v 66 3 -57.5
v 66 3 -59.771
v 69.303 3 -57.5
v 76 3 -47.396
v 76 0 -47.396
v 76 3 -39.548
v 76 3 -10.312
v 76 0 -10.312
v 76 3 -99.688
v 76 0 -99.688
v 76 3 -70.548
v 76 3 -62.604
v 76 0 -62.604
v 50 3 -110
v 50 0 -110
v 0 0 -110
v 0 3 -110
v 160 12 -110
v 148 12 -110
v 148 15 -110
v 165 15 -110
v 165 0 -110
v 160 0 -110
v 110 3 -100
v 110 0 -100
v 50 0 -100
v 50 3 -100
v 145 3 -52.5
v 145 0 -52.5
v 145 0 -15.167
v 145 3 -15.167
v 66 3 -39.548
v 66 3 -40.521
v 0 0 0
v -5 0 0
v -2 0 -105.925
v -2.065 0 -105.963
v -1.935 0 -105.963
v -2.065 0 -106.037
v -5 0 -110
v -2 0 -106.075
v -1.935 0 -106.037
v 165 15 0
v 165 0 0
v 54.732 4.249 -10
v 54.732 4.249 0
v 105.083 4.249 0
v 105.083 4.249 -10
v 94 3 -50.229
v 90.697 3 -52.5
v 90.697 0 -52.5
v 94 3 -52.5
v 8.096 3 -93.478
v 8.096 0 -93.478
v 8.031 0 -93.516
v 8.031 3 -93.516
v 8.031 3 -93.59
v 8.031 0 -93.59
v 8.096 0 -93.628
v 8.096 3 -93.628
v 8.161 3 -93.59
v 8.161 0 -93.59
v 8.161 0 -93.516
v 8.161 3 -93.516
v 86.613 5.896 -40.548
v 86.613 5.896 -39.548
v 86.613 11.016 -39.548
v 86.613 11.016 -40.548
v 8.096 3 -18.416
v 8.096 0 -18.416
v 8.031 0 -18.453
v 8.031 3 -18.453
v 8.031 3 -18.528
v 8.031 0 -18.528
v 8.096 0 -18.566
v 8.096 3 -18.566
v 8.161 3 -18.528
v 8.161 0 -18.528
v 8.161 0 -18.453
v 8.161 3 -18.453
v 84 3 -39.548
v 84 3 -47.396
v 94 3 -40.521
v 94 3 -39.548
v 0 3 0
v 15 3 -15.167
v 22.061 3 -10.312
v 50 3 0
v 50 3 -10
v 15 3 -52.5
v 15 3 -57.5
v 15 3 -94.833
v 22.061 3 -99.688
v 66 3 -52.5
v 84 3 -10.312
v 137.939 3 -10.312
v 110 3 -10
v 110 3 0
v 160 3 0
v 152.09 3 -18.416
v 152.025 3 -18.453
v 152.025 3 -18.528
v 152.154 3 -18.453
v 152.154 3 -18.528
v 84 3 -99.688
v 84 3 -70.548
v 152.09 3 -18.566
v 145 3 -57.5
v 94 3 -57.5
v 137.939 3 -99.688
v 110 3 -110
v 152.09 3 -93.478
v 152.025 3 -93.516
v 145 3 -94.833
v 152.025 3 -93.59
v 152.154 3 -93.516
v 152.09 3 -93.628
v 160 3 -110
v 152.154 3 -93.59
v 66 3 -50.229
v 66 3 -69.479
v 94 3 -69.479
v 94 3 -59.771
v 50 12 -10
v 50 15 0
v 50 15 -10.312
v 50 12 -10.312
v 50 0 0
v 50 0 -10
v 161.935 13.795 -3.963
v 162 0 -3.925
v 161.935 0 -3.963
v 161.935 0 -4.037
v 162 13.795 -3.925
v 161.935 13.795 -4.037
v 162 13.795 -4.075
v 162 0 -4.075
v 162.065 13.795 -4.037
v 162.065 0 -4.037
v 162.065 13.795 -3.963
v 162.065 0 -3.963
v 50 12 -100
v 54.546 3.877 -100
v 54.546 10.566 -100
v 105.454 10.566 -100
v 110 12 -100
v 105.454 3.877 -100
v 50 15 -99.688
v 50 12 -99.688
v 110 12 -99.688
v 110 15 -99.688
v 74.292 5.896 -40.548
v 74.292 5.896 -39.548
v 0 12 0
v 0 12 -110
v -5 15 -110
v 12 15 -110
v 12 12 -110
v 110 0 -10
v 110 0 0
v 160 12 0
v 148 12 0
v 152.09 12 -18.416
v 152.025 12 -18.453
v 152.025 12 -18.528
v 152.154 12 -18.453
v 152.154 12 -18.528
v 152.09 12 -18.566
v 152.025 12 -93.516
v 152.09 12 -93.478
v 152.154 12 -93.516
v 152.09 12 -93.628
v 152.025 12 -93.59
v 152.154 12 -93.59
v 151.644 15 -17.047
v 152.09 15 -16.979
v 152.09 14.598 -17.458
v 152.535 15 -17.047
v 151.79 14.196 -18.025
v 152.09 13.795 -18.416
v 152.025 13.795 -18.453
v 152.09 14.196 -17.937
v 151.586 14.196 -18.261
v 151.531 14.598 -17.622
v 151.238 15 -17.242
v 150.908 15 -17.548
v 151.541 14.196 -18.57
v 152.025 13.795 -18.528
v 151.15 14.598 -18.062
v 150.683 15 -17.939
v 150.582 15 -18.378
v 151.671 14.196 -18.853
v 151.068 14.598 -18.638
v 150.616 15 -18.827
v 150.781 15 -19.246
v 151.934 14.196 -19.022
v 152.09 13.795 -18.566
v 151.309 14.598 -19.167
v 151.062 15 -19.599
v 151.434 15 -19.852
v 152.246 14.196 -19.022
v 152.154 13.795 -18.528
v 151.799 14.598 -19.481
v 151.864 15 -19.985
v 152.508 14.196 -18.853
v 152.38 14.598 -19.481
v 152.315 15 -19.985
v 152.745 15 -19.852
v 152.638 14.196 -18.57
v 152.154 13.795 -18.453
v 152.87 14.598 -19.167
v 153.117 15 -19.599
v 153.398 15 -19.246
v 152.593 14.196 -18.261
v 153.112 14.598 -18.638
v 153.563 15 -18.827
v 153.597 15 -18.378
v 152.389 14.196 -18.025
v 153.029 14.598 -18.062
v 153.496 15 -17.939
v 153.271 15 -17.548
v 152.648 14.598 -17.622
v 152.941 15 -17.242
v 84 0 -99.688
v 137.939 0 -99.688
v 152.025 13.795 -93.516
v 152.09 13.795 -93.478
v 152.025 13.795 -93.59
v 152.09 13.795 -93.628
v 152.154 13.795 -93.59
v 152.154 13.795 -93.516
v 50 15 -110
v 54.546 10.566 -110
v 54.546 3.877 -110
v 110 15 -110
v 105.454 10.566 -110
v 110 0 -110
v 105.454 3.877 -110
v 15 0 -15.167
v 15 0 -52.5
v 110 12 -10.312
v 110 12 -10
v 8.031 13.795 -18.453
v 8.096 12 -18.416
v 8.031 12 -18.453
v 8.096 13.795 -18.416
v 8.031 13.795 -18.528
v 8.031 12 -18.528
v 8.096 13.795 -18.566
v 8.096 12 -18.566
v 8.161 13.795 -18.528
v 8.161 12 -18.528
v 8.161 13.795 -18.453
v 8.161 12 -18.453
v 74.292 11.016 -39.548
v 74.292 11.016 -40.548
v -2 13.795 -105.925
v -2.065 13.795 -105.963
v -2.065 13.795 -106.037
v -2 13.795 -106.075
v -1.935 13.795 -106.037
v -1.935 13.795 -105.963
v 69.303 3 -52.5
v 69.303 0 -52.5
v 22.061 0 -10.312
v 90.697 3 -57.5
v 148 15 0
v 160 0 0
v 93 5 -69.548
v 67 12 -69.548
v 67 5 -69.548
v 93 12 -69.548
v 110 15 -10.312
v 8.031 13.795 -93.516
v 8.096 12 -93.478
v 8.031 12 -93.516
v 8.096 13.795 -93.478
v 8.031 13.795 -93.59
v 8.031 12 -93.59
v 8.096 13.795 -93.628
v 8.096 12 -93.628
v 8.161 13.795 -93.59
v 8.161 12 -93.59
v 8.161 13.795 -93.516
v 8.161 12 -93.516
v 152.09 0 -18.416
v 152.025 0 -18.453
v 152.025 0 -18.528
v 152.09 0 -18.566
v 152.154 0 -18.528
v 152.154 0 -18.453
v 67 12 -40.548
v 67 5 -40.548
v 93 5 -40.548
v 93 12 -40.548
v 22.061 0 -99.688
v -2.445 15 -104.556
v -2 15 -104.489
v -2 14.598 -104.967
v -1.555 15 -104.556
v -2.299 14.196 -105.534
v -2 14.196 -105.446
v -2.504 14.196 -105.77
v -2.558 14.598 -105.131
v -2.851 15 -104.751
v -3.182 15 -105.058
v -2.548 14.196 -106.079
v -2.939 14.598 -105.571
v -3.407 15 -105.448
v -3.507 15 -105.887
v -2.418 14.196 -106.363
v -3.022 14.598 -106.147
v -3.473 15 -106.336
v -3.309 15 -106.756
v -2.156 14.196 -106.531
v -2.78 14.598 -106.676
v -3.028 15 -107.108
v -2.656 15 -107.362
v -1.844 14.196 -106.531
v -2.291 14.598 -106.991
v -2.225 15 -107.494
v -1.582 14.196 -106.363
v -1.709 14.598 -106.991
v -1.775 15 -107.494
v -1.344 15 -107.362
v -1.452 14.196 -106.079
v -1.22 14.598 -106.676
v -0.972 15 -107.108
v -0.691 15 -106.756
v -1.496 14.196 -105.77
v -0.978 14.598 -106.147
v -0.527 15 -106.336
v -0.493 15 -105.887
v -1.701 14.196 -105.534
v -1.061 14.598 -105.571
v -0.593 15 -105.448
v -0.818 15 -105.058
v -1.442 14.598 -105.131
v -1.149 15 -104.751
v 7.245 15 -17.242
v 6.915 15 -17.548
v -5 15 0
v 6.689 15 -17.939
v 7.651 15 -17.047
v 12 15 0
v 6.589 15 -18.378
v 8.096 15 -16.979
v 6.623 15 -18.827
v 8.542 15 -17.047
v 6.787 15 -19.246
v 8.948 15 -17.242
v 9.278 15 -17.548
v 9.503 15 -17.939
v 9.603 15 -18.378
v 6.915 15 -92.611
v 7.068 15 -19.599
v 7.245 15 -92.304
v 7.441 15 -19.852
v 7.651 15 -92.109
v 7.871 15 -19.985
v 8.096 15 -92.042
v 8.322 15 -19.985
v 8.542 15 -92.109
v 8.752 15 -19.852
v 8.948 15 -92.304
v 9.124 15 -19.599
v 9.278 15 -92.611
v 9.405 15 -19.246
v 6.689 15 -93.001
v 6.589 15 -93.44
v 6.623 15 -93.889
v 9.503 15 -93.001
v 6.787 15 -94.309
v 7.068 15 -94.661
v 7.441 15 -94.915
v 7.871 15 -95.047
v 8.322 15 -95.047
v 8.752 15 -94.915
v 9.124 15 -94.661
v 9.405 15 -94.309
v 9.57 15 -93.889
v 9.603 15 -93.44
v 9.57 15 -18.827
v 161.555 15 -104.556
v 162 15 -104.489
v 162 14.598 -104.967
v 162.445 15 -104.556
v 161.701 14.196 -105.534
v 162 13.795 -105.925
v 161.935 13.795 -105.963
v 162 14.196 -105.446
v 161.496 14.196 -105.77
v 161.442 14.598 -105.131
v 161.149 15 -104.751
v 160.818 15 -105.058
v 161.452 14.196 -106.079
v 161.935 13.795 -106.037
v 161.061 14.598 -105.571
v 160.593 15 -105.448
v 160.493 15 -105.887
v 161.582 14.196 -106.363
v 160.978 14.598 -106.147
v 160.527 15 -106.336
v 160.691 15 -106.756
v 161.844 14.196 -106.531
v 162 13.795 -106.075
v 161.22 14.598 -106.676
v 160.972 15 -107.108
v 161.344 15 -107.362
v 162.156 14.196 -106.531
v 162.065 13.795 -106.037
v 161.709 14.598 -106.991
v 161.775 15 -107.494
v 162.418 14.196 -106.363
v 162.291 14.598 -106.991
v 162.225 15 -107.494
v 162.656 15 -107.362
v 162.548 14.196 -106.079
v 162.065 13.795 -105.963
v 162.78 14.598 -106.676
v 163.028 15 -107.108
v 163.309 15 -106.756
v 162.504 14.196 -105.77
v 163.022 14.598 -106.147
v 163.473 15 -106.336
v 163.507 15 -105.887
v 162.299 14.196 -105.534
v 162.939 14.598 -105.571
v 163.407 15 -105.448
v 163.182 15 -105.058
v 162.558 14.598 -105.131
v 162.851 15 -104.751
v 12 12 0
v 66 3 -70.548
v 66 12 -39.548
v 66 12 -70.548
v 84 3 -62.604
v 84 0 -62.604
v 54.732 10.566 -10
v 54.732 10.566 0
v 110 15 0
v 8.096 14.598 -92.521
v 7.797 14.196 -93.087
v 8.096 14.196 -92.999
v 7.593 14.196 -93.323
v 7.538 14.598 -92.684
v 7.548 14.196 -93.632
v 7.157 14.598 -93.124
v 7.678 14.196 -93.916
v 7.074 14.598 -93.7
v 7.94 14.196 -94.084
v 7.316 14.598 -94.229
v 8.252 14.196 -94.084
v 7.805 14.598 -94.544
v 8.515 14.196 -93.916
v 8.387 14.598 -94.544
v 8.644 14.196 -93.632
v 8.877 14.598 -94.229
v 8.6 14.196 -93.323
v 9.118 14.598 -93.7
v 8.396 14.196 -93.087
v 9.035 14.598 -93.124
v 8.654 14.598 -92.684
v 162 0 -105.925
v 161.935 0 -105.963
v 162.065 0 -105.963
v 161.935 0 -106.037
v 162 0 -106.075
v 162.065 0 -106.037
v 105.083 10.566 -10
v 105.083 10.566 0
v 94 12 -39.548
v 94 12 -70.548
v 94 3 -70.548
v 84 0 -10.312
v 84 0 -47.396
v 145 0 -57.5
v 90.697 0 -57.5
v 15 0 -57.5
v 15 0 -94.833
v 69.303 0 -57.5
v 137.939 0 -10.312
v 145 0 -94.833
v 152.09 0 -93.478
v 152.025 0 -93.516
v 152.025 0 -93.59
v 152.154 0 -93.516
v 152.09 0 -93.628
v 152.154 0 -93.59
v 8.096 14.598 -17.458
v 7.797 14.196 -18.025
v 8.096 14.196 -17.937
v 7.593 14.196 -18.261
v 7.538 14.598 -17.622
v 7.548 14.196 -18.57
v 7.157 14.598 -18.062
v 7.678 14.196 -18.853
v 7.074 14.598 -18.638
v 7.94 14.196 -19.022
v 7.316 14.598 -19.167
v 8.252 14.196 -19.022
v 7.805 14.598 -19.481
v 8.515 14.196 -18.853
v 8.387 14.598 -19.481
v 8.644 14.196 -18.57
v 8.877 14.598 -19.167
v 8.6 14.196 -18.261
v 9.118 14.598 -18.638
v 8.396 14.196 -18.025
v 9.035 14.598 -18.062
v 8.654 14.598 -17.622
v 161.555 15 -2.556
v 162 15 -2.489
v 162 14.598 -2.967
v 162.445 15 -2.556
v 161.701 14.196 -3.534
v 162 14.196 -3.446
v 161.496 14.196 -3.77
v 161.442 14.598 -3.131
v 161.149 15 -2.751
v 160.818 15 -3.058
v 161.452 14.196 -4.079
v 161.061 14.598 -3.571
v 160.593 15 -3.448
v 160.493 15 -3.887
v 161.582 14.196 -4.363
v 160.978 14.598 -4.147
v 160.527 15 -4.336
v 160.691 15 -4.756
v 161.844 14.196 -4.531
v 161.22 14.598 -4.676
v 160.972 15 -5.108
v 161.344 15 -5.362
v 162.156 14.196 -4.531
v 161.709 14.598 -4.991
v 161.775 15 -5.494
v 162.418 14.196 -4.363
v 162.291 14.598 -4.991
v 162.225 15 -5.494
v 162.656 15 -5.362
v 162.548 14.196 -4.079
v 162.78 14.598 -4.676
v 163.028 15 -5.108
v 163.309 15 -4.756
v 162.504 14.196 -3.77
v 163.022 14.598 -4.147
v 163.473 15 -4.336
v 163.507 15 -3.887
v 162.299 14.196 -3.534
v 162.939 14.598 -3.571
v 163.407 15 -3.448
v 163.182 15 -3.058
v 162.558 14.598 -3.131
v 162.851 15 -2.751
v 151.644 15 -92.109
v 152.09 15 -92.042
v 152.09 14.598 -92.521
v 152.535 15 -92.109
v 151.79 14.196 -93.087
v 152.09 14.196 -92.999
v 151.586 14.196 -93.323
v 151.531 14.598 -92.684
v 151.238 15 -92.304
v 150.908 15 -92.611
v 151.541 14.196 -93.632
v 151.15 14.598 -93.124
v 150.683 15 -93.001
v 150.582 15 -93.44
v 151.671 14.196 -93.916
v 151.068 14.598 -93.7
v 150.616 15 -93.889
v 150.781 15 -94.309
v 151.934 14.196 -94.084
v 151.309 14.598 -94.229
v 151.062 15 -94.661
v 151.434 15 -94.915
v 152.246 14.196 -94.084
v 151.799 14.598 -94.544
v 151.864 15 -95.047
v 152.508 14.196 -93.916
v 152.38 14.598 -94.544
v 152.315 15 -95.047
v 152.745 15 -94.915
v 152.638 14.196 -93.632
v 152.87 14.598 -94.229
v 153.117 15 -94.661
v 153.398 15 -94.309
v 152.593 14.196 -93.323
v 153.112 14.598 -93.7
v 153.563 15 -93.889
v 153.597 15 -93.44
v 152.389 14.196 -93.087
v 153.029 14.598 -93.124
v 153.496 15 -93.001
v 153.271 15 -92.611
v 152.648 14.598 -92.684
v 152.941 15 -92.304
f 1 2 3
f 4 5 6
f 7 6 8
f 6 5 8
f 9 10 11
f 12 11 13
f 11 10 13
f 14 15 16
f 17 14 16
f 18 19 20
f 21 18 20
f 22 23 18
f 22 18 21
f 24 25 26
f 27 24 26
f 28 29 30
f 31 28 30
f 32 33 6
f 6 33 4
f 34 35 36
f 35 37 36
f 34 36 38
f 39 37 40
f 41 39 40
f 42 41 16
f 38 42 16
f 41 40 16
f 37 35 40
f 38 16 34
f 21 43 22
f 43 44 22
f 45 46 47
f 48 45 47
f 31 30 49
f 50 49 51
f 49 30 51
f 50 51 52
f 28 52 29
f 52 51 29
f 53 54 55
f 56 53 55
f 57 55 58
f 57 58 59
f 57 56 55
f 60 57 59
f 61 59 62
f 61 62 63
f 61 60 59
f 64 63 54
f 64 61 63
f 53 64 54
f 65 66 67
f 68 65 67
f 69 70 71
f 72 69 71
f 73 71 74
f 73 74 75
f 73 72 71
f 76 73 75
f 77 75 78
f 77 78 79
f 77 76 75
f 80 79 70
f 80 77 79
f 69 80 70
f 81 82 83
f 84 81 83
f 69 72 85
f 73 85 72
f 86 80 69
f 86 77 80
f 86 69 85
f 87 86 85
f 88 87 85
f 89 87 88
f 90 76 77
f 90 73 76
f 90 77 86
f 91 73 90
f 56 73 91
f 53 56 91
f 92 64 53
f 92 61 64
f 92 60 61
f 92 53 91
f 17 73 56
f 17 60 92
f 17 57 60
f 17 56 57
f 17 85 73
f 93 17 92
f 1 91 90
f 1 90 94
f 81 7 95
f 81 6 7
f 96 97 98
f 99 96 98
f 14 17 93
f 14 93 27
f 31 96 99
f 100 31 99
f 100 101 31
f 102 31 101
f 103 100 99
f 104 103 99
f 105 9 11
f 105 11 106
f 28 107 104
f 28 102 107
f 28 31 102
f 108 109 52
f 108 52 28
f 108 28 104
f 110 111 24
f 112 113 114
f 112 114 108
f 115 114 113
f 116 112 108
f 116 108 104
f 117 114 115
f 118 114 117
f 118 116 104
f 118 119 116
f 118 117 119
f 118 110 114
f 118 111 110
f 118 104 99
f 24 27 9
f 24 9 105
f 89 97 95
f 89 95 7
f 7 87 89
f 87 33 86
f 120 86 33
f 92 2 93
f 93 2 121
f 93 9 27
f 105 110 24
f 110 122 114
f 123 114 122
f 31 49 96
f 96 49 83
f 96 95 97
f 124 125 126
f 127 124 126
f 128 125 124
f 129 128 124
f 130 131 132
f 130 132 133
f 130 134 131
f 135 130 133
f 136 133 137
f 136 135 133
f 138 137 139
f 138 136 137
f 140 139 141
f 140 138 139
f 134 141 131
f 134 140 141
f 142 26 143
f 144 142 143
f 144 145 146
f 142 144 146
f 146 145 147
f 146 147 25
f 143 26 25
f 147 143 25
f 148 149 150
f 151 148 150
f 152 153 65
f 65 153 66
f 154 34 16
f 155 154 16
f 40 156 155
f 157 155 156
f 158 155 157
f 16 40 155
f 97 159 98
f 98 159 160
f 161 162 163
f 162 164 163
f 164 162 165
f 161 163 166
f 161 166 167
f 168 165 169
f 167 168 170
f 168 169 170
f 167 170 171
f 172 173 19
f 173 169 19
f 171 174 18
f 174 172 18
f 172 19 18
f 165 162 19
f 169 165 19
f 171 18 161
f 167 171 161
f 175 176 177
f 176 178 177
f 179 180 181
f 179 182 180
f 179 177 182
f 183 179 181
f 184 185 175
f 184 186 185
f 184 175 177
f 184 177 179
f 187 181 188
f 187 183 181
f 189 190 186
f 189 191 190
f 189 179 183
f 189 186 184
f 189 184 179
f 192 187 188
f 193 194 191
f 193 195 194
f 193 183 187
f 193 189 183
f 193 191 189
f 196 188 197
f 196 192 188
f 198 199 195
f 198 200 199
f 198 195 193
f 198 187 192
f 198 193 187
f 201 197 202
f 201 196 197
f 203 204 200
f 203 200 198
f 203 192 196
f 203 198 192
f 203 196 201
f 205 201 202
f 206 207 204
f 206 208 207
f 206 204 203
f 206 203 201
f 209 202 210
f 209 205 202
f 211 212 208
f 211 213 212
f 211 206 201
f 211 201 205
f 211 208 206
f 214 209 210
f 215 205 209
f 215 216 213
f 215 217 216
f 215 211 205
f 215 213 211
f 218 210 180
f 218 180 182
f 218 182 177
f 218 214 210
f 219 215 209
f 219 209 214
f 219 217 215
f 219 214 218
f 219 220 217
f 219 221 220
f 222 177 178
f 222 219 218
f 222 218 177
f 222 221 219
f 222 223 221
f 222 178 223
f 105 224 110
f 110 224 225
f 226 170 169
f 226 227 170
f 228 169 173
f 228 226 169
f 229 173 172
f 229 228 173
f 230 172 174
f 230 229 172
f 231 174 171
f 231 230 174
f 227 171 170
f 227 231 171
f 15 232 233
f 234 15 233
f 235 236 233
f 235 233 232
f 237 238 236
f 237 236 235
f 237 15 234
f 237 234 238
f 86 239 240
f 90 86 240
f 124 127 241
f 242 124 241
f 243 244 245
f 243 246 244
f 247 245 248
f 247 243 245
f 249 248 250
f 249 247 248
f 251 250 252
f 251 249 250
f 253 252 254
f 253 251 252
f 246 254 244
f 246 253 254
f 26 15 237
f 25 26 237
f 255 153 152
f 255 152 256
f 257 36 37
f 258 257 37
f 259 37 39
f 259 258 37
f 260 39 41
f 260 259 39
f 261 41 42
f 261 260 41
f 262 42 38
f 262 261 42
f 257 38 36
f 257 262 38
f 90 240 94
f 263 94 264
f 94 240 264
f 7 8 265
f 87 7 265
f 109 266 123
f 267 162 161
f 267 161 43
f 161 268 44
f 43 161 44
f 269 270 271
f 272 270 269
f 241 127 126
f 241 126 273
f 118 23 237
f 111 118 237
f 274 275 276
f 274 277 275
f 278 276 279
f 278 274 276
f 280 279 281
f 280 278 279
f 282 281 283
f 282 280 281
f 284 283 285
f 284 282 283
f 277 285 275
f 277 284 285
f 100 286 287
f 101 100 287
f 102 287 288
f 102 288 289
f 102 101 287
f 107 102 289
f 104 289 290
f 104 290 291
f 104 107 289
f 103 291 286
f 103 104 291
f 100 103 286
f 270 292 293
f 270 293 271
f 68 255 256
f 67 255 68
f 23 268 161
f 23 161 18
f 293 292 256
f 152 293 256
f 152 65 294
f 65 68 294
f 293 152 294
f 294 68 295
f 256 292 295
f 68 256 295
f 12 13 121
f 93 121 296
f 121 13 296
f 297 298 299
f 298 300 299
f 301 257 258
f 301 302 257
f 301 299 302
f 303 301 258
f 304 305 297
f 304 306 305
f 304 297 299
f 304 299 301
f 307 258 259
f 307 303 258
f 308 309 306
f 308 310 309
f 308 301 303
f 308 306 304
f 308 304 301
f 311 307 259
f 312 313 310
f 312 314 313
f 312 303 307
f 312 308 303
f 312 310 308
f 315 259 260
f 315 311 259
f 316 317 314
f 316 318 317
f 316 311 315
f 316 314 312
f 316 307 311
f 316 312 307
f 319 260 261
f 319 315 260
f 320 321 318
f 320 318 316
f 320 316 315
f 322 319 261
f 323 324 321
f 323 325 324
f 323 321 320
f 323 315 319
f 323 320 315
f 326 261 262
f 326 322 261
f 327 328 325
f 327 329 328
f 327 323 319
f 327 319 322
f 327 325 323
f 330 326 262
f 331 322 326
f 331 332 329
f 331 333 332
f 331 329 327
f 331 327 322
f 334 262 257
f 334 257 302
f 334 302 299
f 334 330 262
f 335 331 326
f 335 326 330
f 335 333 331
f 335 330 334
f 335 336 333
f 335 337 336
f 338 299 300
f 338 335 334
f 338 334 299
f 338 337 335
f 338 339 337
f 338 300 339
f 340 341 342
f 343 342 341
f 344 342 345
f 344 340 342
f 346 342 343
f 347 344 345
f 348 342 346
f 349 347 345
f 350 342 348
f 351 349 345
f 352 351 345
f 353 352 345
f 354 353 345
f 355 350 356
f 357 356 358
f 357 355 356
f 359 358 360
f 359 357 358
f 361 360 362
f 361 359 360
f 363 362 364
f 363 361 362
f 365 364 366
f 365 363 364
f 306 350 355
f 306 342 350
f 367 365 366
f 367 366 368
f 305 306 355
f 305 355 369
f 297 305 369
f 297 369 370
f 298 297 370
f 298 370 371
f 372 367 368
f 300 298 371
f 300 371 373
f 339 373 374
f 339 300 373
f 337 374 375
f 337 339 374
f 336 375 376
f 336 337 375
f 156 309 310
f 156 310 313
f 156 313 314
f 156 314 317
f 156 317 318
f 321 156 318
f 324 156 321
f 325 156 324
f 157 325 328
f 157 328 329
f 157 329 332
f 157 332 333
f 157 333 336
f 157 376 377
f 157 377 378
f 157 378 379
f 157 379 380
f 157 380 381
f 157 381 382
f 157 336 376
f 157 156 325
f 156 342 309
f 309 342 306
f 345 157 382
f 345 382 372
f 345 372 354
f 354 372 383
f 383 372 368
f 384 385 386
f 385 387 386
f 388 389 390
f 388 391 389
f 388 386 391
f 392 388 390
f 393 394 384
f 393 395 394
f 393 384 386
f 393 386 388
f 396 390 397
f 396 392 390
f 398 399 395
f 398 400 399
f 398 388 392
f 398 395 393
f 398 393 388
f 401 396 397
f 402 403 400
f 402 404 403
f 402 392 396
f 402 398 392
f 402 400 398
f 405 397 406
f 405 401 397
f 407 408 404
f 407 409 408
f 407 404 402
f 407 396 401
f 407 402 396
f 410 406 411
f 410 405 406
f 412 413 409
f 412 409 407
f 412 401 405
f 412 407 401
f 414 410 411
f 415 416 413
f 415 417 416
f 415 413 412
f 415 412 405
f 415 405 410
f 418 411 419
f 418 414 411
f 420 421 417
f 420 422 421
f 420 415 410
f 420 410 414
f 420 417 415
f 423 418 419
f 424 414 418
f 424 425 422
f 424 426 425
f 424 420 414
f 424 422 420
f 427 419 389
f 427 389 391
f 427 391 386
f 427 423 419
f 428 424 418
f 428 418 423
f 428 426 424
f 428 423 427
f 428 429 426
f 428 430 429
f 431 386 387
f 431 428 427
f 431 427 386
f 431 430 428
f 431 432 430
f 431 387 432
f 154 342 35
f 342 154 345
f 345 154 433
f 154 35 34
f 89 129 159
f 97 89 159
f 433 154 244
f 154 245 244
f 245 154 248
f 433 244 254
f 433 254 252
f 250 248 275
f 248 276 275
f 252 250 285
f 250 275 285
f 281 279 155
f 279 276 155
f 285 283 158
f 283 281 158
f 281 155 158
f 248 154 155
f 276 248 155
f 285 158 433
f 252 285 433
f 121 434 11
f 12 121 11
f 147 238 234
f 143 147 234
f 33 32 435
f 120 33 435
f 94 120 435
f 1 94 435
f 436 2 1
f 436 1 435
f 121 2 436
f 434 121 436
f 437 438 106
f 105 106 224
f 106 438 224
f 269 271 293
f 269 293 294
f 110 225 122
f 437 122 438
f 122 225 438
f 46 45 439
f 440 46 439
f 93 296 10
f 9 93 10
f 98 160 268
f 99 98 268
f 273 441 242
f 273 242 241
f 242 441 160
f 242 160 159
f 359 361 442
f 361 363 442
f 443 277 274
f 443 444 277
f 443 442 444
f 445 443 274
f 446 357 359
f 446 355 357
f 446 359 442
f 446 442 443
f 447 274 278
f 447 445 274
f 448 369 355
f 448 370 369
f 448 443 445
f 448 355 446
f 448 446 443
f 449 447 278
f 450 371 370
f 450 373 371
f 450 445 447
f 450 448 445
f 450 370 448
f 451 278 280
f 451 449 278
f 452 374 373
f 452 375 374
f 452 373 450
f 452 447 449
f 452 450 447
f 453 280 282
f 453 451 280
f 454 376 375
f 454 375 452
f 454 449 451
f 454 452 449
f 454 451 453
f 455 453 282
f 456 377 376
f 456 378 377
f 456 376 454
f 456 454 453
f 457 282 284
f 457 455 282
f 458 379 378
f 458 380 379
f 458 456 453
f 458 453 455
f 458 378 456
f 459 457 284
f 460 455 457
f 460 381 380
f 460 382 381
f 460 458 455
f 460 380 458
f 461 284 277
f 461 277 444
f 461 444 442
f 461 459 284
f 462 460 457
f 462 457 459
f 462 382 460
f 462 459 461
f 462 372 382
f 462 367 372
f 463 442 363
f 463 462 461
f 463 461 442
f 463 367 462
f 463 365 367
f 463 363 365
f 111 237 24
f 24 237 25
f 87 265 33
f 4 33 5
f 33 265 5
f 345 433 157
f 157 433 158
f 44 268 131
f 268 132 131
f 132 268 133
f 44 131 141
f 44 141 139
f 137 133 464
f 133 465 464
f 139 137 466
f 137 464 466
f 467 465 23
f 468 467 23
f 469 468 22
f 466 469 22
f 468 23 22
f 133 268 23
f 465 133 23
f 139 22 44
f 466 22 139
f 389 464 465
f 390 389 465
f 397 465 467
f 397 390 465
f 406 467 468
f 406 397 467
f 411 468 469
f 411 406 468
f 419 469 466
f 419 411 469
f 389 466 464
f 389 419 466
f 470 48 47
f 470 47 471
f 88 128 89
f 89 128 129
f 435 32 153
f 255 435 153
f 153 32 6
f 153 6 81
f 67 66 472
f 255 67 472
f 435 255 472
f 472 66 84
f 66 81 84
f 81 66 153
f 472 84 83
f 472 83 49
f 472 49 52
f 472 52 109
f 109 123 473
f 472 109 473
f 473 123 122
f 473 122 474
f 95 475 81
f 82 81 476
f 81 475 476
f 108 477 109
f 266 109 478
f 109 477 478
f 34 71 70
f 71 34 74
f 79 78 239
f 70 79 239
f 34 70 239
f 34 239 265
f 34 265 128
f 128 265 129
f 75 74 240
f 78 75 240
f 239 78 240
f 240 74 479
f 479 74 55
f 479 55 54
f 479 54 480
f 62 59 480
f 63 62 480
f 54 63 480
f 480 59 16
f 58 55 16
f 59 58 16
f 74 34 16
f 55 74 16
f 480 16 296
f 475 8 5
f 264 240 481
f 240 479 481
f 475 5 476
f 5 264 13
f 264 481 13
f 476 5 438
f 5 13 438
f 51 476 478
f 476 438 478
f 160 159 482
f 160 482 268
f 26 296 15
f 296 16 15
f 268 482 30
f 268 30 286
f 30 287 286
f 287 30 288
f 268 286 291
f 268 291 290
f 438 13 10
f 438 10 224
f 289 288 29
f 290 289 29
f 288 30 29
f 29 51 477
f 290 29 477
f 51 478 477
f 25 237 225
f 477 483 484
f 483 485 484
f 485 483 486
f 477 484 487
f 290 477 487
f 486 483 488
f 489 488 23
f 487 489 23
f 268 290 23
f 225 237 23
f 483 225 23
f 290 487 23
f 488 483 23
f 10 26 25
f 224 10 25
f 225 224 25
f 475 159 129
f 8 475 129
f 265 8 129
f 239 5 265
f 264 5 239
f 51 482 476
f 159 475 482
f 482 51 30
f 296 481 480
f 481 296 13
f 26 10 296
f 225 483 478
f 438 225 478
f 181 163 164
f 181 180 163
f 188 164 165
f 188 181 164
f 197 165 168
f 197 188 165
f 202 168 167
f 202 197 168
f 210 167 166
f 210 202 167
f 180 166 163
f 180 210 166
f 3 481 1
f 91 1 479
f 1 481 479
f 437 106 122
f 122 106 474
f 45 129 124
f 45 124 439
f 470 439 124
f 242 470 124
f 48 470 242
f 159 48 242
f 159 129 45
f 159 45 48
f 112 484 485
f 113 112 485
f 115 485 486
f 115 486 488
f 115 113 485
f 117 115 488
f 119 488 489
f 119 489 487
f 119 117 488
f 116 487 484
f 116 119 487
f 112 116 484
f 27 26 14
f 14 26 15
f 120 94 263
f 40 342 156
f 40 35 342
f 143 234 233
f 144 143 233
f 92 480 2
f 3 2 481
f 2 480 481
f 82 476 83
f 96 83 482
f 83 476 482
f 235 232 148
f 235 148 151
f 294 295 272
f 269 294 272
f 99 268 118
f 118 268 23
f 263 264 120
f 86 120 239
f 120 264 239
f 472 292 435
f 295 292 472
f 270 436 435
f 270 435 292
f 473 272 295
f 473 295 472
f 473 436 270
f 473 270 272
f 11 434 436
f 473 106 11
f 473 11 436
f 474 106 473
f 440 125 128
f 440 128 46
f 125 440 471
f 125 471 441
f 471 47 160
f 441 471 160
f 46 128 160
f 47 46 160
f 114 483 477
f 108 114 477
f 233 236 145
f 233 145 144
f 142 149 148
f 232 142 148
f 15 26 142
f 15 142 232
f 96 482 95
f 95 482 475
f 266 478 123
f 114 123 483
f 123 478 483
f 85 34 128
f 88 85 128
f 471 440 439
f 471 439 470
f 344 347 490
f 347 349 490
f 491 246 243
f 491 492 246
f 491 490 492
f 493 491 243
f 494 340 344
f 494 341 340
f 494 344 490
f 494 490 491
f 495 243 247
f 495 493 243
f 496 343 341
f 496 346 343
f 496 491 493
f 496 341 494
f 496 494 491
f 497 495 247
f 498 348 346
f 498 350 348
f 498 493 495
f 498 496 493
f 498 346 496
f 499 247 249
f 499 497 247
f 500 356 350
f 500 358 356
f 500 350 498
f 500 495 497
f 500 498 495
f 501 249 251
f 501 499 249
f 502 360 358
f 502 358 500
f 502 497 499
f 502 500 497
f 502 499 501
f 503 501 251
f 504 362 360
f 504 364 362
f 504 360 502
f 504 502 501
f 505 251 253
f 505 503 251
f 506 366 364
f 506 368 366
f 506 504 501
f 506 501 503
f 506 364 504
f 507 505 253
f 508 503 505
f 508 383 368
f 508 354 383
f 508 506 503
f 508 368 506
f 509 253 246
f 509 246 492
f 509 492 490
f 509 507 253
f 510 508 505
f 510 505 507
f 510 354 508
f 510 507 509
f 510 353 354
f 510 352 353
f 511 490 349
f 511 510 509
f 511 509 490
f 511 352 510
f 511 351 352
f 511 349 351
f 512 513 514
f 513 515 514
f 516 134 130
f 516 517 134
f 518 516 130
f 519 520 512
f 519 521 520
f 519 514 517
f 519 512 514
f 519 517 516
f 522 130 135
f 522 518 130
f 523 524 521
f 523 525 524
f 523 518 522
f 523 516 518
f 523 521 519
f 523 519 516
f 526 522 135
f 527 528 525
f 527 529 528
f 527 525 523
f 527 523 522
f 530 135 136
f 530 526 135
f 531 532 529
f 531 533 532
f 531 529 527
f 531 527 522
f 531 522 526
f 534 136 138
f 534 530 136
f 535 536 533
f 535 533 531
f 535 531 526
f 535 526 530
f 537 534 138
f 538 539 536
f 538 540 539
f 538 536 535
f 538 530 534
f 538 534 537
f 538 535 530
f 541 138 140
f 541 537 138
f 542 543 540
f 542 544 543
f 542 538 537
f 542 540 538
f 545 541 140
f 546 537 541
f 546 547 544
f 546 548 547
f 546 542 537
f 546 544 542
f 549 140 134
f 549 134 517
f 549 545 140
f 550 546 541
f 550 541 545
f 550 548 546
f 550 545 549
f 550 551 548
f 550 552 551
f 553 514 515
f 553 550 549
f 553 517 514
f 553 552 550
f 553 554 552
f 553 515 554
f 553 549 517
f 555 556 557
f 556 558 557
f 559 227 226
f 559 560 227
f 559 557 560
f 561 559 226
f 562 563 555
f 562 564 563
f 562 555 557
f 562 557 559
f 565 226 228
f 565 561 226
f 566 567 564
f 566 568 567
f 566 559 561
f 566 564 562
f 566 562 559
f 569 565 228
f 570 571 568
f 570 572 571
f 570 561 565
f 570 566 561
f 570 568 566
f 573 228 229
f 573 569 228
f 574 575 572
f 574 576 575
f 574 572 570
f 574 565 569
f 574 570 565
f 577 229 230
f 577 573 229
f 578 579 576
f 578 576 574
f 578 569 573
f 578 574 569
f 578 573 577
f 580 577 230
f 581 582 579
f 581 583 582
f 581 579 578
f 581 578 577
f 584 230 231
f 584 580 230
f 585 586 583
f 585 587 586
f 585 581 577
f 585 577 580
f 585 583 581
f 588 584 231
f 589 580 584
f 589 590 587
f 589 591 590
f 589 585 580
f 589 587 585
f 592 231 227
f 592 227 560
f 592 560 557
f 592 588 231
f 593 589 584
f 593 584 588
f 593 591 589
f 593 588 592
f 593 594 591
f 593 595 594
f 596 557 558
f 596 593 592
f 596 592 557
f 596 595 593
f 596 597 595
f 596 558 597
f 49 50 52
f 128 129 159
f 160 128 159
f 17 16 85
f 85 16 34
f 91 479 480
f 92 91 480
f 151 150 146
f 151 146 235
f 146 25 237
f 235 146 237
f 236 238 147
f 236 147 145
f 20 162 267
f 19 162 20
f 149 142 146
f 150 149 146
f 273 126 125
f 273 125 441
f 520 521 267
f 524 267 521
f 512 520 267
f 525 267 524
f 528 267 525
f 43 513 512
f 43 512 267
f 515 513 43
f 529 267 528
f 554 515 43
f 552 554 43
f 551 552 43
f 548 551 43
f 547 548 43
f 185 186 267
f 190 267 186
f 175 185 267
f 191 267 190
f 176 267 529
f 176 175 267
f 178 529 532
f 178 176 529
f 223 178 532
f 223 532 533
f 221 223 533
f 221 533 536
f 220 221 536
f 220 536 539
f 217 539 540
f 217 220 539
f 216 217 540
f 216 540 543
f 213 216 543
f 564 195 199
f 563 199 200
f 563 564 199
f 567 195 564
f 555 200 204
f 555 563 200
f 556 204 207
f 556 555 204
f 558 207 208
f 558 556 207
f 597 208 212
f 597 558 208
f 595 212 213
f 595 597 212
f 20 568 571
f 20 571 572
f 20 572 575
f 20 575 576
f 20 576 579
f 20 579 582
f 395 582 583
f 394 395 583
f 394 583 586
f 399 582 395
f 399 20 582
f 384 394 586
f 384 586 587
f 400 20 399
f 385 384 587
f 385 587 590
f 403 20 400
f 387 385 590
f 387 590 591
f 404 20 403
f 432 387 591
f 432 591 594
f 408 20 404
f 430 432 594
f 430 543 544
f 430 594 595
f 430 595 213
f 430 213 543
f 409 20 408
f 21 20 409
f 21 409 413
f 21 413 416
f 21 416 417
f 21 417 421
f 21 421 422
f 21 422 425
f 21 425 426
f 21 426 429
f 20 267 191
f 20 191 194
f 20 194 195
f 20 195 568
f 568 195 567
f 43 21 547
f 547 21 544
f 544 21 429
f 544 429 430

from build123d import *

# Parameters (mm, degrees)
BOSS_EXTRUDE1_DEPTH                   = 3
SKETCH1_5_W                           = 5
SKETCH1_5_H                           = 110
BOSS_EXTRUDE2_DEPTH                   = 12
SKETCH1_5_W_2                         = 60
SKETCH1_5_H_2                         = 10
BOSS_EXTRUDE2_2_DEPTH                 = 12
BOSS_EXTRUDE2_3_DEPTH                 = 12
BOSS_EXTRUDE2_4_DEPTH                 = 12
SKETCH2_W                             = 17
SKETCH2_H                             = 110
SKETCH2_W_2                           = 60
SKETCH2_H_2                           = 10.3125
BOSS_EXTRUDE3_DEPTH                   = 3
SKETCH3_W                             = 50.351183416
SKETCH3_H                             = 6.317122643
CUT_EXTRUDE1_DEPTH                    = 12
SKETCH4_W                             = 50.90857659
SKETCH4_H                             = 6.688718092
CUT_EXTRUDE2_DEPTH                    = 12
SKETCH5_W                             = 28
SKETCH5_H                             = 31
BOSS_EXTRUDE4_DEPTH                   = 9
SKETCH6_W                             = 26
SKETCH6_H                             = 29
CUT_EXTRUDE3_DEPTH                    = 7
SKETCH7_W                             = 12.321460949
SKETCH7_H                             = 5.119870138
CUT_EXTRUDE4_DEPTH                    = 2
F_97_0_0059_DIAMETER_HOLE9_AT_2_COUNT = 2
F_97_0_0059_DIAMETER_HOLE9_AT_2_PITCH = 75.062280812
F_97_0_0059_DIAMETER_HOLE9_AT_3_COUNT = 2
F_97_0_0059_DIAMETER_HOLE9_AT_3_PITCH = 162.38349121
F_97_0_0059_DIAMETER_HOLE9_AT_4_COUNT = 2
F_97_0_0059_DIAMETER_HOLE9_AT_4_PITCH = 143.993236706


with BuildPart() as part:
    # Sketch1 → Boss-Extrude1 (new body)
    with BuildSketch(Plane(origin=(0, 0, 0), x_dir=(1, 0, 0), z_dir=(0, 1, 0))):
        Polygon((0, 0), (50, 0), (50, 10), (110, 10), (110, 0), (160, 0), (160, 110), (110, 110), (110, 100), (50, 100), (50, 110), (0, 110), align=None)
        Polygon((22.060541032, 10.3125), (76, 47.39587804), (76, 10.3125), align=None, mode=Mode.SUBTRACT)
        Polygon((15, 15.16662196), (15, 52.5), (69.303095331, 52.5), align=None, mode=Mode.SUBTRACT)
        Polygon((84, 10.3125), (84, 47.39587804), (137.939458968, 10.3125), align=None, mode=Mode.SUBTRACT)
        Polygon((15, 57.5), (15, 94.83337804), (69.303095331, 57.5), align=None, mode=Mode.SUBTRACT)
        Polygon((145, 15.16662196), (90.696904669, 52.5), (145, 52.5), align=None, mode=Mode.SUBTRACT)
        Polygon((22.060541032, 99.6875), (76, 99.6875), (76, 62.60412196), align=None, mode=Mode.SUBTRACT)
        Polygon((145, 57.5), (90.696904669, 57.5), (145, 94.83337804), align=None, mode=Mode.SUBTRACT)
        Polygon((84, 62.60412196), (84, 99.6875), (137.939458968, 99.6875), align=None, mode=Mode.SUBTRACT)
    extrude(amount=BOSS_EXTRUDE1_DEPTH)

    # Sketch5 → Boss-Extrude4 (add)
    with BuildSketch(Plane(origin=(0, 3, 0), x_dir=(1, 0, 0), z_dir=(0, 1, 0))):
        with Locations((80, 55.04790198)):
            Rectangle(SKETCH5_W, SKETCH5_H)
    extrude(amount=BOSS_EXTRUDE4_DEPTH)

    # Sketch6 → Cut-Extrude3 (cut)
    with BuildSketch(Plane(origin=(0, 12, 0), x_dir=(1, 0, 0), z_dir=(0, 1, 0))):
        with Locations((80, 55.04790198)):
            Rectangle(SKETCH6_W, SKETCH6_H)
    extrude(amount=-CUT_EXTRUDE3_DEPTH, mode=Mode.SUBTRACT)

    # Sketch7 → Cut-Extrude4 (cut)
    with BuildSketch(Plane.XY.offset(-39.54790198)):
        with Locations((80.452241745, 8.456025881)):
            Rectangle(SKETCH7_W, SKETCH7_H)
    extrude(amount=-CUT_EXTRUDE4_DEPTH, mode=Mode.SUBTRACT)


with BuildPart() as body_2:
    # Sketch1<5> → Boss-Extrude2 (new body)
    with BuildSketch(Plane(origin=(0, 0, 0), x_dir=(1, 0, 0), z_dir=(0, 1, 0))):
        with Locations((-2.5, 55)):
            Rectangle(SKETCH1_5_W, SKETCH1_5_H)
    extrude(amount=BOSS_EXTRUDE2_DEPTH)



with BuildPart() as body_3:
    # Sketch1<5> → Boss-Extrude2 2 (new body)
    with BuildSketch(Plane(origin=(0, 0, 0), x_dir=(1, 0, 0), z_dir=(0, 1, 0))):
        with Locations((80, 5)):
            Rectangle(SKETCH1_5_W_2, SKETCH1_5_H_2)
    extrude(amount=BOSS_EXTRUDE2_2_DEPTH)


with BuildPart() as body_4:
    # Sketch1<5> → Boss-Extrude2 3 (new body)
    with BuildSketch(Plane(origin=(0, 0, 0), x_dir=(1, 0, 0), z_dir=(0, 1, 0))):
        with Locations((80, 105)):
            Rectangle(SKETCH1_5_W_2, SKETCH1_5_H_2)
    extrude(amount=BOSS_EXTRUDE2_3_DEPTH)


with BuildPart() as body_5:
    # Sketch1<5> → Boss-Extrude2 4 (new body)
    with BuildSketch(Plane(origin=(0, 0, 0), x_dir=(1, 0, 0), z_dir=(0, 1, 0))):
        with Locations((162.5, 55)):
            Rectangle(SKETCH1_5_W, SKETCH1_5_H)
    extrude(amount=BOSS_EXTRUDE2_4_DEPTH)


with BuildPart() as body_2_1:
    add(body_2.part)

    add(body_3.part)  # Boss-Extrude3 merges body 3

    add(body_4.part)  # Boss-Extrude3 merges body 4

    add(body_5.part)  # Boss-Extrude3 merges body 5
    # Sketch2 → Boss-Extrude3 (add)
    with BuildSketch(Plane(origin=(0, 12, 0), x_dir=(1, 0, 0), z_dir=(0, 1, 0))):
        with Locations((3.5, 55)):
            Rectangle(SKETCH2_W, SKETCH2_H)
        with Locations((156.5, 55)):
            Rectangle(SKETCH2_W, SKETCH2_H)
        with Locations((80, 104.84375)):
            Rectangle(SKETCH2_W_2, SKETCH2_H_2)
        with Locations((80, 5.15625)):
            Rectangle(SKETCH2_W_2, SKETCH2_H_2)
    extrude(amount=BOSS_EXTRUDE3_DEPTH)

    # Sketch3 → Cut-Extrude1 (cut)
    with BuildSketch(Plane.XY):
        with Locations((79.907101138, 7.407101137)):
            Rectangle(SKETCH3_W, SKETCH3_H)
    extrude(amount=-CUT_EXTRUDE1_DEPTH, mode=Mode.SUBTRACT)

    # Sketch4 → Cut-Extrude2 (cut)
    with BuildSketch(Plane(origin=(0, 0, -110), x_dir=(-1, 0, 0), z_dir=(0, 0, -1))):
        with Locations((-80, 7.221303413)):
            Rectangle(SKETCH4_W, SKETCH4_H)
    extrude(amount=-CUT_EXTRUDE2_DEPTH, mode=Mode.SUBTRACT)

    # Sketch14 → #97 (0.0059) Diameter Hole2 (revolve, cut)
    with BuildSketch(Plane(origin=(-2, 15, -106), x_dir=(0, 0, 1), z_dir=(1, 0, 0))):
        Polygon((0, 0), (0, 15), (0.07493, 15), (0.07493, 1.205257537), (1.5113, 0), align=None)
    revolve(axis=Axis((-2, 21.35, -106), (0, -1, 0)), mode=Mode.SUBTRACT)

    # Sketch18 → #97 (0.0059) Diameter Hole4 (revolve, cut)
    with BuildSketch(Plane(origin=(162, 15, -106), x_dir=(0, 0, 1), z_dir=(1, 0, 0))):
        Polygon((0, 0), (0, 15), (0.07493, 15), (0.07493, 1.205257537), (1.5113, 0), align=None)
    revolve(axis=Axis((162, 21.35, -106), (0, -1, 0)), mode=Mode.SUBTRACT)

    # Sketch20 → #97 (0.0059) Diameter Hole5 (revolve, cut)
    with BuildSketch(Plane(origin=(162, 15, -4), x_dir=(0, 0, 1), z_dir=(1, 0, 0))):
        Polygon((0, 0), (0, 15), (0.07493, 15), (0.07493, 1.205257537), (1.5113, 0), align=None)
    revolve(axis=Axis((162, 21.35, -4), (0, -1, 0)), mode=Mode.SUBTRACT)


with BuildPart() as f_97_0_0059_diameter_hole9_tool:
    # Sketch31 → #97 (0.0059) Diameter Hole9 (revolve)
    with BuildSketch(Plane(origin=(8.09628051, 15, -93.553027892), x_dir=(0, 0, 1), z_dir=(1, 0, 0))):
        Polygon((0, 0), (0, 15), (0.07493, 15), (0.07493, 1.205257537), (1.5113, 0), align=None)
    f_97_0_0059_diameter_hole9 = revolve(axis=Axis((8.09628051, 21.35, -93.553027892), (0, -1, 0)))


with BuildPart() as part_1:
    add(part.part)

    # #97 (0.0059) Diameter Hole9: cut by f_97_0_0059_diameter_hole9_tool
    add(f_97_0_0059_diameter_hole9_tool.part, mode=Mode.SUBTRACT)


with BuildPart() as body_2_2:
    add(body_2_1.part)

    # #97 (0.0059) Diameter Hole9: cut by f_97_0_0059_diameter_hole9_tool
    add(f_97_0_0059_diameter_hole9_tool.part, mode=Mode.SUBTRACT)


with BuildPart() as f_97_0_0059_diameter_hole9_at_2_tool:
    # #97 (0.0059) Diameter Hole9 at 2: #97 (0.0059) Diameter Hole9 ×2
    with Locations(*[(0, 0, i * F_97_0_0059_DIAMETER_HOLE9_AT_2_PITCH) for i in range(1, F_97_0_0059_DIAMETER_HOLE9_AT_2_COUNT)]):
        add(f_97_0_0059_diameter_hole9)


with BuildPart() as part_2:
    add(part_1.part)

    # #97 (0.0059) Diameter Hole9 at 2: cut by f_97_0_0059_diameter_hole9_at_2_tool
    add(f_97_0_0059_diameter_hole9_at_2_tool.part, mode=Mode.SUBTRACT)


with BuildPart() as body_2_3:
    add(body_2_2.part)

    # #97 (0.0059) Diameter Hole9 at 2: cut by f_97_0_0059_diameter_hole9_at_2_tool
    add(f_97_0_0059_diameter_hole9_at_2_tool.part, mode=Mode.SUBTRACT)


with BuildPart() as f_97_0_0059_diameter_hole9_at_3_tool:
    # #97 (0.0059) Diameter Hole9 at 3: #97 (0.0059) Diameter Hole9 ×2
    with Locations(*[Vector(0.8867480039532973, 0, 0.4622531530285576) * (i * F_97_0_0059_DIAMETER_HOLE9_AT_3_PITCH) for i in range(1, F_97_0_0059_DIAMETER_HOLE9_AT_3_COUNT)]):
        add(f_97_0_0059_diameter_hole9)


with BuildPart() as part_3:
    add(part_2.part)

    # #97 (0.0059) Diameter Hole9 at 3: cut by f_97_0_0059_diameter_hole9_at_3_tool
    add(f_97_0_0059_diameter_hole9_at_3_tool.part, mode=Mode.SUBTRACT)


with BuildPart() as body_2_4:
    add(body_2_3.part)

    # #97 (0.0059) Diameter Hole9 at 3: cut by f_97_0_0059_diameter_hole9_at_3_tool
    add(f_97_0_0059_diameter_hole9_at_3_tool.part, mode=Mode.SUBTRACT)


with BuildPart() as f_97_0_0059_diameter_hole9_at_4_tool:
    # #97 (0.0059) Diameter Hole9 at 4: #97 (0.0059) Diameter Hole9 ×2
    with Locations(*[(i * F_97_0_0059_DIAMETER_HOLE9_AT_4_PITCH, 0, 0) for i in range(1, F_97_0_0059_DIAMETER_HOLE9_AT_4_COUNT)]):
        add(f_97_0_0059_diameter_hole9)


with BuildPart() as part_4:
    add(part_3.part)

    # #97 (0.0059) Diameter Hole9 at 4: cut by f_97_0_0059_diameter_hole9_at_4_tool
    add(f_97_0_0059_diameter_hole9_at_4_tool.part, mode=Mode.SUBTRACT)


with BuildPart() as body_2_5:
    add(body_2_4.part)

    # #97 (0.0059) Diameter Hole9 at 4: cut by f_97_0_0059_diameter_hole9_at_4_tool
    add(f_97_0_0059_diameter_hole9_at_4_tool.part, mode=Mode.SUBTRACT)


solid = Compound([part_4.part, body_2_5.part])
